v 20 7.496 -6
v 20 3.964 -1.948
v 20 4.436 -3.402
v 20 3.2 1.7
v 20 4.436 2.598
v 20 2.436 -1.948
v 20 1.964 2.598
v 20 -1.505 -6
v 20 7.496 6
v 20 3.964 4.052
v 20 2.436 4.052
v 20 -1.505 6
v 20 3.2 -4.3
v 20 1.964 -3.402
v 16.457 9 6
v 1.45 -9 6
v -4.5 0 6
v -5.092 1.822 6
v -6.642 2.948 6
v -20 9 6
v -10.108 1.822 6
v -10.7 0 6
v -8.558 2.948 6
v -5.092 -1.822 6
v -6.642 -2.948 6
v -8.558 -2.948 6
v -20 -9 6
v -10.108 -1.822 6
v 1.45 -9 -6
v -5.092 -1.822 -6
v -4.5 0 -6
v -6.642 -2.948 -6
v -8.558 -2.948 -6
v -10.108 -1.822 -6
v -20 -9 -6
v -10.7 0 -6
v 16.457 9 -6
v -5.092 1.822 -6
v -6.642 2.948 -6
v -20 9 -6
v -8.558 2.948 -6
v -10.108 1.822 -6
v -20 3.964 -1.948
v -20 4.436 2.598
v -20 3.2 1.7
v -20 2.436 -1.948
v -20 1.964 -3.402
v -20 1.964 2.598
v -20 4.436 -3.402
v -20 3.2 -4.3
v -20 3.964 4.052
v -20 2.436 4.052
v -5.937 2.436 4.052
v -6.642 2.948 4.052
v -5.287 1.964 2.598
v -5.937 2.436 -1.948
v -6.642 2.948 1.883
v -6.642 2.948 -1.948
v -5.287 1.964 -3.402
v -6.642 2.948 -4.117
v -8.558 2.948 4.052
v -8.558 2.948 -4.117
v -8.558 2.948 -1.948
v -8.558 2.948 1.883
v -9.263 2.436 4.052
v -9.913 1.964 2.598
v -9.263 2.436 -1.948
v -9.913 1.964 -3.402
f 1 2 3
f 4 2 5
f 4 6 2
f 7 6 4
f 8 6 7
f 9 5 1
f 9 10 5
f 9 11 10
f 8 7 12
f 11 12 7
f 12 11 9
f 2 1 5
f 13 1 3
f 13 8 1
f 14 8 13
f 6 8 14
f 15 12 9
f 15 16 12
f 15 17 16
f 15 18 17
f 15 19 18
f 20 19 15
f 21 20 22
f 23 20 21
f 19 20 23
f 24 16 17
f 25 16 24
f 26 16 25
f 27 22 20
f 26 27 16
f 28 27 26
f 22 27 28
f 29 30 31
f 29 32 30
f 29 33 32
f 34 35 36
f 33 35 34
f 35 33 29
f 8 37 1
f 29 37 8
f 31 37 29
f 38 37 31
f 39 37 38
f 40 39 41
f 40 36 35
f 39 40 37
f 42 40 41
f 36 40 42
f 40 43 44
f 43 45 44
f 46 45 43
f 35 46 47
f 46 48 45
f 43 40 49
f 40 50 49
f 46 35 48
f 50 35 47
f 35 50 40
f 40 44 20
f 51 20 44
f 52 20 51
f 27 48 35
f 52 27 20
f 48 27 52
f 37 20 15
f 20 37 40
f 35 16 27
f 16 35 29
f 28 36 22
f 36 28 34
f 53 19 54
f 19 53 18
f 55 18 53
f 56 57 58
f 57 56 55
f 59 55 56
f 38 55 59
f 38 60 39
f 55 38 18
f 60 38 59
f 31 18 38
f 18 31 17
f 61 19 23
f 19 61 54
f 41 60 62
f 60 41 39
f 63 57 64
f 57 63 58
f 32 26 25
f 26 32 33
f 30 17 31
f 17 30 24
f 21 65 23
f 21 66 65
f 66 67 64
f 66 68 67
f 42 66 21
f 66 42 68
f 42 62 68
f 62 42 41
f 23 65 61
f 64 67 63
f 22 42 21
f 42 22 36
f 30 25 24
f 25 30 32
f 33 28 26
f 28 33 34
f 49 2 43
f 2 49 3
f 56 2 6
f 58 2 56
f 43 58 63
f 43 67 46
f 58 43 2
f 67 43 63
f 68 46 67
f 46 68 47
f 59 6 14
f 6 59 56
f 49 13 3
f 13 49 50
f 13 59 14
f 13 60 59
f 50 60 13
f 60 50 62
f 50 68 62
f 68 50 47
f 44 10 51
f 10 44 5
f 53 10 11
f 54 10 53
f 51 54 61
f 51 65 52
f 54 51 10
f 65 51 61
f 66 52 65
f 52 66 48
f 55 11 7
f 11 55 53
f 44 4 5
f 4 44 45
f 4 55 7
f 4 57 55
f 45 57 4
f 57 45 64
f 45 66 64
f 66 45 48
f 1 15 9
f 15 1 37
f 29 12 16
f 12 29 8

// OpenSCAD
module rotary()
{

difference() {
	// BODY (to be subtracted from)
	cube([length,width,thick+2],center=true);

   // MOTOR SHAFT HOLE 
	translate([4*hradius-length/2, 0, 0])
	   cylinder(r=hradius, h=thickplus, center=true);
	// WIRES
	 translate([0,3.2,-3])
	   rotate([0,90,0])
            cylinder(r=dia,h=length+width,center=true);

	 translate([0,3.2,3])
	   rotate([0,90,0])
            cylinder(r=dia,h=length+width,center=true);

	translate([23,16,0])
		rotate([0,0,67])
			cube([width,width,thickplus],center=true);

	translate([23,-10,0])
		rotate([0,0,22])
			cube([3*width,width,thickplus],center=true);

	}
}

	alpha  = 12; // Angle between radials in degrees

	length = 40; // mm   Main Block
	width  = 18; // mm
	thick = 10;  // 8mm
    thickplus = 2*thick;

	hradius = 3.1;    // 6.3mm = .25"
	dia     = 1.3;  // 1/16" wire trough
	yoffset = 5;  // ydistance from edge to mounting hole
    zoffset = 5;

rotary();
